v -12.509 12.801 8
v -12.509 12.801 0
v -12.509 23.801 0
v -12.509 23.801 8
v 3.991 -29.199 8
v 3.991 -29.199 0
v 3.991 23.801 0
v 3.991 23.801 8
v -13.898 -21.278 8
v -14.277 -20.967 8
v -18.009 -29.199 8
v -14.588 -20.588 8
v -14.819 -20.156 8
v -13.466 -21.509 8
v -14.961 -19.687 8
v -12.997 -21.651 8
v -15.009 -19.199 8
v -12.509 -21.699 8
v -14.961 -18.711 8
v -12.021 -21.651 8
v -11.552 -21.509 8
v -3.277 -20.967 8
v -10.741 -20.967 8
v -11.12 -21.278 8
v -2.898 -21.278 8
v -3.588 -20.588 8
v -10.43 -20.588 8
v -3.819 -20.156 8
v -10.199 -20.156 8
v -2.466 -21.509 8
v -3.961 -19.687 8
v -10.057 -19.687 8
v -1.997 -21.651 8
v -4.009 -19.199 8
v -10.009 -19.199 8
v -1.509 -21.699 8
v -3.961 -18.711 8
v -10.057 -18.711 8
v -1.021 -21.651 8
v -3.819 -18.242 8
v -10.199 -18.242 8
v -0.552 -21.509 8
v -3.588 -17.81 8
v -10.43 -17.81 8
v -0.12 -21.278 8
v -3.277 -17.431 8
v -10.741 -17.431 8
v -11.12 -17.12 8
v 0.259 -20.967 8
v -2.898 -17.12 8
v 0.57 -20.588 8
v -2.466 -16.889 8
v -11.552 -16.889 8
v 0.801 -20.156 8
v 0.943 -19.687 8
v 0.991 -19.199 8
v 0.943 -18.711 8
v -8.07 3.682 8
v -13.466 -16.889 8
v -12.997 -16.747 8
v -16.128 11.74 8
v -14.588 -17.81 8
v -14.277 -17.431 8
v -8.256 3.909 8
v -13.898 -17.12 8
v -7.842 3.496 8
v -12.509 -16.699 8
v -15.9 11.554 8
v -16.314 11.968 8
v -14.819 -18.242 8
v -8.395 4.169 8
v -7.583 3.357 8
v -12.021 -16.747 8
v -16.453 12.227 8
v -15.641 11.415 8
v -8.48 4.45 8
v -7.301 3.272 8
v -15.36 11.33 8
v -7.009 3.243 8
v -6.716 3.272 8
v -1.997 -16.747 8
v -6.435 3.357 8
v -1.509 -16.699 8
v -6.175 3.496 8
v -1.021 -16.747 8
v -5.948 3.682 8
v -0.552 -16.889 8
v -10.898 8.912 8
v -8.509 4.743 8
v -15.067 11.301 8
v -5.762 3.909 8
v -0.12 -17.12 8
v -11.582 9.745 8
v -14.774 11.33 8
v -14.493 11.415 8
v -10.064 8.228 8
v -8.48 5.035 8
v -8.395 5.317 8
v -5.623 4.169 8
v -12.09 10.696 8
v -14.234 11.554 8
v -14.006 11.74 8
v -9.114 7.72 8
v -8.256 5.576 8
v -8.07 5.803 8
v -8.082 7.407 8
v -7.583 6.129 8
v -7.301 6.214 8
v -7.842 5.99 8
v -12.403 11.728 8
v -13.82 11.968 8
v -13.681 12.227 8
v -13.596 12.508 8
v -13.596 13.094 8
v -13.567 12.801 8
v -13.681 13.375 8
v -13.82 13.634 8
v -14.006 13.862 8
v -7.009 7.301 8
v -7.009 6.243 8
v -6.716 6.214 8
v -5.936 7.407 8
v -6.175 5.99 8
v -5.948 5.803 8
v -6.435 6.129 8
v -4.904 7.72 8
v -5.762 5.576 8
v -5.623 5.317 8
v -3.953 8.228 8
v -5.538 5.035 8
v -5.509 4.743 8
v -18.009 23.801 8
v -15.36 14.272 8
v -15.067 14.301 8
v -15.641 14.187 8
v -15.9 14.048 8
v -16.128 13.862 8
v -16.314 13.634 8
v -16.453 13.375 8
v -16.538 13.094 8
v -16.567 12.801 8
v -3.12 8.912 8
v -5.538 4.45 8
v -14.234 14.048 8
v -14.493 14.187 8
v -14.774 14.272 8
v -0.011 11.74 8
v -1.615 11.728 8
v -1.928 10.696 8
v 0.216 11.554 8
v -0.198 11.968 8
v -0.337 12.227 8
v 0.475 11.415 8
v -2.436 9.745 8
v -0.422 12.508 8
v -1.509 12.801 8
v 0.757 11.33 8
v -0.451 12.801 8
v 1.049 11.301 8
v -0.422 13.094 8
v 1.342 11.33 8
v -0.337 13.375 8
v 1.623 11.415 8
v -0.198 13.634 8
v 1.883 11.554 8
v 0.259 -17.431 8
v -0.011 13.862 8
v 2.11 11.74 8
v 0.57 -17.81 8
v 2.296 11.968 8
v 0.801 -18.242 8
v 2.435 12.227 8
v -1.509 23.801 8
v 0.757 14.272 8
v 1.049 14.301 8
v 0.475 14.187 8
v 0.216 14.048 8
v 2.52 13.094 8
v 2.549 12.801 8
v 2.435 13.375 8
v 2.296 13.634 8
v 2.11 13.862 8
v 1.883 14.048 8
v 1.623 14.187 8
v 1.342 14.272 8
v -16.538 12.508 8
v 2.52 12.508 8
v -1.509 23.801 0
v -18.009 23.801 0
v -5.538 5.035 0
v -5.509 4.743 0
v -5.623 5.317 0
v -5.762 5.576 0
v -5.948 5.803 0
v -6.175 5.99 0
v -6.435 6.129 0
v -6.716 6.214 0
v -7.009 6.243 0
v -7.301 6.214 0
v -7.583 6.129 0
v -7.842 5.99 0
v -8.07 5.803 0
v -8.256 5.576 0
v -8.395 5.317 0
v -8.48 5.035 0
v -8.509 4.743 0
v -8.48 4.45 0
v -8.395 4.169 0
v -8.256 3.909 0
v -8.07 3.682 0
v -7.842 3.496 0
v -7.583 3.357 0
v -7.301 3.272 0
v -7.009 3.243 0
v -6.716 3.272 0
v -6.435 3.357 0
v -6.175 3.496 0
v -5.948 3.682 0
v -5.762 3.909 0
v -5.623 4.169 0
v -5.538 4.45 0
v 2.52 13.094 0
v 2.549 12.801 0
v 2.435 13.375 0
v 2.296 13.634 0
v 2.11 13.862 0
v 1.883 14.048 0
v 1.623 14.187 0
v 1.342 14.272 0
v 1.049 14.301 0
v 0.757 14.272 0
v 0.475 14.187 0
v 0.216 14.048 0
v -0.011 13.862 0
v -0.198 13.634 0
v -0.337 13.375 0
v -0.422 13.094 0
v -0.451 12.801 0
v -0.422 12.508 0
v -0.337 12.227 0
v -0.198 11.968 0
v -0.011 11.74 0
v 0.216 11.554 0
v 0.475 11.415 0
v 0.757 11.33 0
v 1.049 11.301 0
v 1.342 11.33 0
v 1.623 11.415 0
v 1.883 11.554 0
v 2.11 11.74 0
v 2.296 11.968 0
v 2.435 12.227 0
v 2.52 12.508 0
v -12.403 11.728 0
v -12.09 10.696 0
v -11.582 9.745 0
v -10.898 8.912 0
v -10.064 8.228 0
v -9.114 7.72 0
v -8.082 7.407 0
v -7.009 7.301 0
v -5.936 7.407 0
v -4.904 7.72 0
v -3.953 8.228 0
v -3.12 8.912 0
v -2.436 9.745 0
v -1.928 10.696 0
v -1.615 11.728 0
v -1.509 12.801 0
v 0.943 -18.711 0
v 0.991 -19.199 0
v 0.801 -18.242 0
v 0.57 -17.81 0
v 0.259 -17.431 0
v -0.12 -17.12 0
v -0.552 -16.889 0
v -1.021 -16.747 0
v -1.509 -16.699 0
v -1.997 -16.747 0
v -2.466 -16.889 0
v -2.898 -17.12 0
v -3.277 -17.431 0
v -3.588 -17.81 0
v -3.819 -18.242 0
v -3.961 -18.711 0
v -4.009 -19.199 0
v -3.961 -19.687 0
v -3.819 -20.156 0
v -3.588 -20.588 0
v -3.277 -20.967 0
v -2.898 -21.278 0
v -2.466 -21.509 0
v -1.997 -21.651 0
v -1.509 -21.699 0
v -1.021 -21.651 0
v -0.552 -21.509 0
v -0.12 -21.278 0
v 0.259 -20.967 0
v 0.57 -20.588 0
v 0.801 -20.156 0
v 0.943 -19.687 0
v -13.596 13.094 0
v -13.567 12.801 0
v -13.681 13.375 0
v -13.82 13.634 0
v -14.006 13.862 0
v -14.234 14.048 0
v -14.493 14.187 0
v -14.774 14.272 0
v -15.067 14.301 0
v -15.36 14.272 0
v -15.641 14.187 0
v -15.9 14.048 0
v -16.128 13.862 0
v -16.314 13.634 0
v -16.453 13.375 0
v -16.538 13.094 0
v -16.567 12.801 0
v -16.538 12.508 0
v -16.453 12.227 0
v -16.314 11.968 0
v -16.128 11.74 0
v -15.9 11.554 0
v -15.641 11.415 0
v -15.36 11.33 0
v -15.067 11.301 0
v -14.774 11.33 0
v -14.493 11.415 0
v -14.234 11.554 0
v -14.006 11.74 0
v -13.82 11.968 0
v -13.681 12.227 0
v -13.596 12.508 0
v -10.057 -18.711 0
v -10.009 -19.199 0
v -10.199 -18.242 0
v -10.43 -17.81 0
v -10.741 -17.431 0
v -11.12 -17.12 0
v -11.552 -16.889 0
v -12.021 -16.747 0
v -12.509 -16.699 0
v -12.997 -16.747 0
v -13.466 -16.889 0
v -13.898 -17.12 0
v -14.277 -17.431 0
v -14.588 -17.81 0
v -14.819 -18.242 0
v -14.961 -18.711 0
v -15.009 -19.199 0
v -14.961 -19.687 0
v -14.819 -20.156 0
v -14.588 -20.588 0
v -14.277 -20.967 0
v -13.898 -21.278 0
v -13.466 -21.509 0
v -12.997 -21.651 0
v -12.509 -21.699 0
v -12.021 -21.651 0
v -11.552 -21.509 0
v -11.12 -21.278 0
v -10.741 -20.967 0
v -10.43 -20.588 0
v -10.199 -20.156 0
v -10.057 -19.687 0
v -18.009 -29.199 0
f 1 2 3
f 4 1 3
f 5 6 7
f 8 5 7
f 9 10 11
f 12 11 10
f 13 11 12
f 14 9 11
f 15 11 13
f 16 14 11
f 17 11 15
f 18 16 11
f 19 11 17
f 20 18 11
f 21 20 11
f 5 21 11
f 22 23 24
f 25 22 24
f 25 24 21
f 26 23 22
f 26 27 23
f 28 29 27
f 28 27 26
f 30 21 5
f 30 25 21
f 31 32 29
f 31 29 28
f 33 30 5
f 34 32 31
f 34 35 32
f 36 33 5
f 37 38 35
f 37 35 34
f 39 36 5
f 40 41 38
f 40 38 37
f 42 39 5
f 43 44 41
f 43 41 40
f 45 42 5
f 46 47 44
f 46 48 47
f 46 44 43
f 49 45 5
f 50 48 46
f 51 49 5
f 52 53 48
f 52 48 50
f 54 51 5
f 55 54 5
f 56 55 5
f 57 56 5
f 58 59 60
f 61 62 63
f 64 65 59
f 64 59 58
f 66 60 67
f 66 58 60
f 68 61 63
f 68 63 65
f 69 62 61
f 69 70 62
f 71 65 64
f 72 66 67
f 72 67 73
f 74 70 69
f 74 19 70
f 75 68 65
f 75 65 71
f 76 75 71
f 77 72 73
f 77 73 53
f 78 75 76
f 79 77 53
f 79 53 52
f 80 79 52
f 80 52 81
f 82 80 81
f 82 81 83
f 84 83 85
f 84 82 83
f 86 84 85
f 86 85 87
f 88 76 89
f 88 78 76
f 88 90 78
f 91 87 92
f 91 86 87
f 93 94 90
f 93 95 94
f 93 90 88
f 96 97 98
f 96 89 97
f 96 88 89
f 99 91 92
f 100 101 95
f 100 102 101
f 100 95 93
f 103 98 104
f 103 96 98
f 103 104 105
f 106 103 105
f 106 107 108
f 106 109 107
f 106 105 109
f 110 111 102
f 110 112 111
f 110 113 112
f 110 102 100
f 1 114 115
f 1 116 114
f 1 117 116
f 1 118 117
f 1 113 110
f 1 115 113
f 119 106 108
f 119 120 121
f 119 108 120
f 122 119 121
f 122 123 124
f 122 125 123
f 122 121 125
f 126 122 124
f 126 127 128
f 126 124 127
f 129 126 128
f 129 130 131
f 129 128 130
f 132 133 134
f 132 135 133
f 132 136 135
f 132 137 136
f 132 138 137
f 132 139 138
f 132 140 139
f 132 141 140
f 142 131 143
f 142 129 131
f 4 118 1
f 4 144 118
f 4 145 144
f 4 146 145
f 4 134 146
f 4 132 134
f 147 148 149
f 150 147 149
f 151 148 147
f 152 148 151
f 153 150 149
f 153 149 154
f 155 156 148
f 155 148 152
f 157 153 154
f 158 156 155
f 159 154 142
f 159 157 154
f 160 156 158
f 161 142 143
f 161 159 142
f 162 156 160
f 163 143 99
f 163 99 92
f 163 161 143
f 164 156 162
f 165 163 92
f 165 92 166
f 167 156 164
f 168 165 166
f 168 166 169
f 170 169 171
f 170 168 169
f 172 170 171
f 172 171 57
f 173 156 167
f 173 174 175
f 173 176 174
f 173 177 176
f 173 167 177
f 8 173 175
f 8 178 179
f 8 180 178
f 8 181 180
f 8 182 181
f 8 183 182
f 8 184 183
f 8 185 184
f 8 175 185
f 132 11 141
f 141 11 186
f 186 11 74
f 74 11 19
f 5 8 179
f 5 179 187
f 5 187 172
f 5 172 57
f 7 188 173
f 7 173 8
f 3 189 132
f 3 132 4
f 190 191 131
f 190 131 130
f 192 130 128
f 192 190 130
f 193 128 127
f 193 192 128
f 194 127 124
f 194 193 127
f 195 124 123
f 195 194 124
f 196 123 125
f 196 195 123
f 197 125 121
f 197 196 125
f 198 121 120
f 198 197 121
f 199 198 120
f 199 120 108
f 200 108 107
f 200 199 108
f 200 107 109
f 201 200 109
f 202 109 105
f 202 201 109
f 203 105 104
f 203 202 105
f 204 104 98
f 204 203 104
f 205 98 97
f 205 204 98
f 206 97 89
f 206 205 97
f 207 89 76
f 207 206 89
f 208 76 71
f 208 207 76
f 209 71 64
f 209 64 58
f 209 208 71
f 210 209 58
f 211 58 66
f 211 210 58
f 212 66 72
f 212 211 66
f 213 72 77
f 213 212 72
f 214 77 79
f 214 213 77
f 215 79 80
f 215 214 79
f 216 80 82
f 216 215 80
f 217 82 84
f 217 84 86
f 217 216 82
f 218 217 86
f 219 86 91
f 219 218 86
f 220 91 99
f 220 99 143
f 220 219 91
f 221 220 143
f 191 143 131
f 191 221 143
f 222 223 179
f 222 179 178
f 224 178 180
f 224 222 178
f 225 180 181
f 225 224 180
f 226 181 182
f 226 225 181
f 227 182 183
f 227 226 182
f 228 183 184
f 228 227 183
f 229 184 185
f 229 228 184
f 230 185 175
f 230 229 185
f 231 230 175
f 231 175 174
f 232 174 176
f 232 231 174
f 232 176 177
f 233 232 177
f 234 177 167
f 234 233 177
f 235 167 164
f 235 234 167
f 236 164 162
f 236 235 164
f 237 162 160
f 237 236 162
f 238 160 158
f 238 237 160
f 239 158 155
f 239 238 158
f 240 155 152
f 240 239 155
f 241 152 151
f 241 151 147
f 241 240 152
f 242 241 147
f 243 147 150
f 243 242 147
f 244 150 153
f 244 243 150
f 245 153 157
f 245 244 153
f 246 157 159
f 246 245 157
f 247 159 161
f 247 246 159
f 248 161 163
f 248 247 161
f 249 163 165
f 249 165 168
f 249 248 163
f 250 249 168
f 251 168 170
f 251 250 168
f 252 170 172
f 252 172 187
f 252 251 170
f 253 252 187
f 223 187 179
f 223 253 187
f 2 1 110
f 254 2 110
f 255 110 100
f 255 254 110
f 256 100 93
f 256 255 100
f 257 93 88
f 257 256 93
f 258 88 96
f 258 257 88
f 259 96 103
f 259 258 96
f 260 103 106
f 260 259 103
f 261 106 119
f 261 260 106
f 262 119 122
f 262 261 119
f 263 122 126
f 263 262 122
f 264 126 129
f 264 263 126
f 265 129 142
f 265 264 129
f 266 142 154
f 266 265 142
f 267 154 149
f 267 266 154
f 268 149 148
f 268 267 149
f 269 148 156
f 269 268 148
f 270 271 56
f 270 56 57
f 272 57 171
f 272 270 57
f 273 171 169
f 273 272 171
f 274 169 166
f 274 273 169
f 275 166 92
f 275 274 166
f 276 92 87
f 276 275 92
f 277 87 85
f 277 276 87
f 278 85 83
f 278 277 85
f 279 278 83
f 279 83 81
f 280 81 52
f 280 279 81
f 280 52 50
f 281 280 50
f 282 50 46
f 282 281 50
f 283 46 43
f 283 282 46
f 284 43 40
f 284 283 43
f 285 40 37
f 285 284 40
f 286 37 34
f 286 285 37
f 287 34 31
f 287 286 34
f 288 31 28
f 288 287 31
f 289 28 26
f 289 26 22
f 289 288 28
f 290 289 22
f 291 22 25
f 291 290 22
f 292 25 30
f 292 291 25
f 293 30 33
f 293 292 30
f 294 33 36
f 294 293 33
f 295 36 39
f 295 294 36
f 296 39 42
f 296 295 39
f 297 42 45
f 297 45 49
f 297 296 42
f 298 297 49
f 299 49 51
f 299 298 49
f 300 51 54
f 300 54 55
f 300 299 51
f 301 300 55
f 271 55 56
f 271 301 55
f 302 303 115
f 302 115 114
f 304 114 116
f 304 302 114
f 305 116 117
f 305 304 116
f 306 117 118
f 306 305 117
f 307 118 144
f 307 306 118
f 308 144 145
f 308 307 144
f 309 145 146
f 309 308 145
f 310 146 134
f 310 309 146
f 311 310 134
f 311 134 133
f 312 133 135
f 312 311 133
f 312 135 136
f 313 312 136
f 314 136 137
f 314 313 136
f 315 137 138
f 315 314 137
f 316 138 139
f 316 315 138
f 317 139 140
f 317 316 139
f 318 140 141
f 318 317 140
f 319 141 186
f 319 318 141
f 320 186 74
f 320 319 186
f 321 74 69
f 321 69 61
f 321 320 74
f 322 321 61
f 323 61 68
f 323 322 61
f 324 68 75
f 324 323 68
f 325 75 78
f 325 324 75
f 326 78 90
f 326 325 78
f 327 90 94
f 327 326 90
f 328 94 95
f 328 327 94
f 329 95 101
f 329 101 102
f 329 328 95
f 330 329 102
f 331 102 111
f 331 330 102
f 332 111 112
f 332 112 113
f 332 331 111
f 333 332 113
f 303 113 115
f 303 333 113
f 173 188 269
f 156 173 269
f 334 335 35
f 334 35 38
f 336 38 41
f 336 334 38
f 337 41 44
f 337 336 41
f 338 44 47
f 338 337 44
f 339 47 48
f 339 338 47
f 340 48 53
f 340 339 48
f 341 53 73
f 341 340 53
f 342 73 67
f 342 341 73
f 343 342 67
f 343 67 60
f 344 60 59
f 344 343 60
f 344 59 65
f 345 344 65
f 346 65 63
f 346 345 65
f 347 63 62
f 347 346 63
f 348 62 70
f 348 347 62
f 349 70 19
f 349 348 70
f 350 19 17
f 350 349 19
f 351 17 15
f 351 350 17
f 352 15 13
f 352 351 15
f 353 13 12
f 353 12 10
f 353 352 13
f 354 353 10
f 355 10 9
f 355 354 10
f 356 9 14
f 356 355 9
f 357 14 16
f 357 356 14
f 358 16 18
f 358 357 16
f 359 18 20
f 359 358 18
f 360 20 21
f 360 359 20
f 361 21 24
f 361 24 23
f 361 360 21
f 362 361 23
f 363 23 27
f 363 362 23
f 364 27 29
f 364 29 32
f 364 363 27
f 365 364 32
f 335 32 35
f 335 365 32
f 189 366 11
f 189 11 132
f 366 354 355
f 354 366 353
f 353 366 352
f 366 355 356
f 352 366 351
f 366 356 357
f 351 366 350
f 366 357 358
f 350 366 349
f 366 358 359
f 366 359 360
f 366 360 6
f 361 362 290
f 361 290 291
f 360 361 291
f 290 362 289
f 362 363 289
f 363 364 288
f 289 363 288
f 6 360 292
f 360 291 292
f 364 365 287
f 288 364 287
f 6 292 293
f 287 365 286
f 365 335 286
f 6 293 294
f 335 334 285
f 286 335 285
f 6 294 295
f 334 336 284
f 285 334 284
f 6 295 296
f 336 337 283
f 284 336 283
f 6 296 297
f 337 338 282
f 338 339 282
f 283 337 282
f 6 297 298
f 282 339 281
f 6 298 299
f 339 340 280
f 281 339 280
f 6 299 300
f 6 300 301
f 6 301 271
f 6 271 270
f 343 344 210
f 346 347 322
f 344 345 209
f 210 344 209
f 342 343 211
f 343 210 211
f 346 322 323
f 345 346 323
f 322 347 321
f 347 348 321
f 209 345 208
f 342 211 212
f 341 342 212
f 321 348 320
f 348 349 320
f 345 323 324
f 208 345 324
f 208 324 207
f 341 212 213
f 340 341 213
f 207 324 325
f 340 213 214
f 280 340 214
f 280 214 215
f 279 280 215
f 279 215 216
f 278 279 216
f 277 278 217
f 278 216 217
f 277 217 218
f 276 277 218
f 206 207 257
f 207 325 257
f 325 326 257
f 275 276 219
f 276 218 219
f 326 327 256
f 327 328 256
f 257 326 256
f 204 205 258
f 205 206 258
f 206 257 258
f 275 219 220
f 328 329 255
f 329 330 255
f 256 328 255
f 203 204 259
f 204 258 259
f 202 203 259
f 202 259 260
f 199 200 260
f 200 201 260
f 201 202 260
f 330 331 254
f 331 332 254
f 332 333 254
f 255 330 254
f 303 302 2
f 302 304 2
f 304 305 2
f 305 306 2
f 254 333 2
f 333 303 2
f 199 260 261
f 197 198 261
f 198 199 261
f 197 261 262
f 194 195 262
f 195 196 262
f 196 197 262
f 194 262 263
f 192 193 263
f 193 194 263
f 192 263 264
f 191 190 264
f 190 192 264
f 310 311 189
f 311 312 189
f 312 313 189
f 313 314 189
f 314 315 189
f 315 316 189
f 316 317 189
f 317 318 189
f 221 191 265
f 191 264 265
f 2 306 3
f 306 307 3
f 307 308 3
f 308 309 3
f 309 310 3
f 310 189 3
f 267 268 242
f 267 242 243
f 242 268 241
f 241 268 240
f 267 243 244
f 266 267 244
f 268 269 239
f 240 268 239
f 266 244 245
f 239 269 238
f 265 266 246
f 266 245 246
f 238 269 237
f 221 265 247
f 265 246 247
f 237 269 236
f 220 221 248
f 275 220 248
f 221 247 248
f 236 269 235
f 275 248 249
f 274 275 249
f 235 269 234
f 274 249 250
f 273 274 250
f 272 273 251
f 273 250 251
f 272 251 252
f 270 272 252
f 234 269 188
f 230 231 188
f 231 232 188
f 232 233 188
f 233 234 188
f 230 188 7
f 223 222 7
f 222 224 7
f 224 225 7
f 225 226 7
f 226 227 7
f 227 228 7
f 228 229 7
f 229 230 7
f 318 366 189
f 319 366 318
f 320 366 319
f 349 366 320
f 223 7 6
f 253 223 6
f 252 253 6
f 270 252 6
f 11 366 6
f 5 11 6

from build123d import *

# Parameters (mm, degrees)
SKETCH_1_W          = 22
SKETCH_1_H          = 53
SKETCH_1_R          = 2.5
SKETCH_1_R_2        = 5.5
SKETCH_1_R_3        = 1.5
EXTRUDE_1_DEPTH     = 8
CUT_EXTRUDE_START   = -10
CUT_EXTRUDE_1_DEPTH = 10


with BuildPart() as part:
    # 草图1 → 凸台-拉伸1 (new body)
    with BuildSketch(Plane.XY):
        with Locations((-7.008849558, -2.699115044)):
            Rectangle(SKETCH_1_W, SKETCH_1_H)
        with Locations((-12.508849558, -19.199115044)):
            Circle(SKETCH_1_R, mode=Mode.SUBTRACT)
        with Locations((-1.508849558, -19.199115044)):
            Circle(SKETCH_1_R, mode=Mode.SUBTRACT)
        with Locations((-7.008849558, 12.800884956)):
            Circle(SKETCH_1_R_2, mode=Mode.SUBTRACT)
        with Locations((-7.008849558, 20.858941567)):
            Circle(SKETCH_1_R_3, mode=Mode.SUBTRACT)
        with Locations((1.049207054, 12.800884956)):
            Circle(SKETCH_1_R_3, mode=Mode.SUBTRACT)
        with Locations((-7.008849558, 4.742828344)):
            Circle(SKETCH_1_R_3, mode=Mode.SUBTRACT)
        with Locations((-15.066906169, 12.800884956)):
            Circle(SKETCH_1_R_3, mode=Mode.SUBTRACT)
    extrude(amount=EXTRUDE_1_DEPTH)

    # 草图2 → 切除-拉伸1 (cut)
    with BuildSketch(Plane.XY.offset(8).offset(CUT_EXTRUDE_START)):
        with BuildLine():
            Line((-12.508849558, 12.800884956), (-12.508849558, 23.800884956))
            Line((-12.508849558, 23.800884956), (-1.508849558, 23.800884956))
            Line((-1.508849558, 23.800884956), (-1.508849558, 12.800884956))
            ThreePointArc((-1.508849558, 12.800884956), (-7.008849558, 7.300884956), (-12.508849558, 12.800884956))
        make_face()
    extrude(amount=CUT_EXTRUDE_1_DEPTH, mode=Mode.SUBTRACT)


solid = part.part
